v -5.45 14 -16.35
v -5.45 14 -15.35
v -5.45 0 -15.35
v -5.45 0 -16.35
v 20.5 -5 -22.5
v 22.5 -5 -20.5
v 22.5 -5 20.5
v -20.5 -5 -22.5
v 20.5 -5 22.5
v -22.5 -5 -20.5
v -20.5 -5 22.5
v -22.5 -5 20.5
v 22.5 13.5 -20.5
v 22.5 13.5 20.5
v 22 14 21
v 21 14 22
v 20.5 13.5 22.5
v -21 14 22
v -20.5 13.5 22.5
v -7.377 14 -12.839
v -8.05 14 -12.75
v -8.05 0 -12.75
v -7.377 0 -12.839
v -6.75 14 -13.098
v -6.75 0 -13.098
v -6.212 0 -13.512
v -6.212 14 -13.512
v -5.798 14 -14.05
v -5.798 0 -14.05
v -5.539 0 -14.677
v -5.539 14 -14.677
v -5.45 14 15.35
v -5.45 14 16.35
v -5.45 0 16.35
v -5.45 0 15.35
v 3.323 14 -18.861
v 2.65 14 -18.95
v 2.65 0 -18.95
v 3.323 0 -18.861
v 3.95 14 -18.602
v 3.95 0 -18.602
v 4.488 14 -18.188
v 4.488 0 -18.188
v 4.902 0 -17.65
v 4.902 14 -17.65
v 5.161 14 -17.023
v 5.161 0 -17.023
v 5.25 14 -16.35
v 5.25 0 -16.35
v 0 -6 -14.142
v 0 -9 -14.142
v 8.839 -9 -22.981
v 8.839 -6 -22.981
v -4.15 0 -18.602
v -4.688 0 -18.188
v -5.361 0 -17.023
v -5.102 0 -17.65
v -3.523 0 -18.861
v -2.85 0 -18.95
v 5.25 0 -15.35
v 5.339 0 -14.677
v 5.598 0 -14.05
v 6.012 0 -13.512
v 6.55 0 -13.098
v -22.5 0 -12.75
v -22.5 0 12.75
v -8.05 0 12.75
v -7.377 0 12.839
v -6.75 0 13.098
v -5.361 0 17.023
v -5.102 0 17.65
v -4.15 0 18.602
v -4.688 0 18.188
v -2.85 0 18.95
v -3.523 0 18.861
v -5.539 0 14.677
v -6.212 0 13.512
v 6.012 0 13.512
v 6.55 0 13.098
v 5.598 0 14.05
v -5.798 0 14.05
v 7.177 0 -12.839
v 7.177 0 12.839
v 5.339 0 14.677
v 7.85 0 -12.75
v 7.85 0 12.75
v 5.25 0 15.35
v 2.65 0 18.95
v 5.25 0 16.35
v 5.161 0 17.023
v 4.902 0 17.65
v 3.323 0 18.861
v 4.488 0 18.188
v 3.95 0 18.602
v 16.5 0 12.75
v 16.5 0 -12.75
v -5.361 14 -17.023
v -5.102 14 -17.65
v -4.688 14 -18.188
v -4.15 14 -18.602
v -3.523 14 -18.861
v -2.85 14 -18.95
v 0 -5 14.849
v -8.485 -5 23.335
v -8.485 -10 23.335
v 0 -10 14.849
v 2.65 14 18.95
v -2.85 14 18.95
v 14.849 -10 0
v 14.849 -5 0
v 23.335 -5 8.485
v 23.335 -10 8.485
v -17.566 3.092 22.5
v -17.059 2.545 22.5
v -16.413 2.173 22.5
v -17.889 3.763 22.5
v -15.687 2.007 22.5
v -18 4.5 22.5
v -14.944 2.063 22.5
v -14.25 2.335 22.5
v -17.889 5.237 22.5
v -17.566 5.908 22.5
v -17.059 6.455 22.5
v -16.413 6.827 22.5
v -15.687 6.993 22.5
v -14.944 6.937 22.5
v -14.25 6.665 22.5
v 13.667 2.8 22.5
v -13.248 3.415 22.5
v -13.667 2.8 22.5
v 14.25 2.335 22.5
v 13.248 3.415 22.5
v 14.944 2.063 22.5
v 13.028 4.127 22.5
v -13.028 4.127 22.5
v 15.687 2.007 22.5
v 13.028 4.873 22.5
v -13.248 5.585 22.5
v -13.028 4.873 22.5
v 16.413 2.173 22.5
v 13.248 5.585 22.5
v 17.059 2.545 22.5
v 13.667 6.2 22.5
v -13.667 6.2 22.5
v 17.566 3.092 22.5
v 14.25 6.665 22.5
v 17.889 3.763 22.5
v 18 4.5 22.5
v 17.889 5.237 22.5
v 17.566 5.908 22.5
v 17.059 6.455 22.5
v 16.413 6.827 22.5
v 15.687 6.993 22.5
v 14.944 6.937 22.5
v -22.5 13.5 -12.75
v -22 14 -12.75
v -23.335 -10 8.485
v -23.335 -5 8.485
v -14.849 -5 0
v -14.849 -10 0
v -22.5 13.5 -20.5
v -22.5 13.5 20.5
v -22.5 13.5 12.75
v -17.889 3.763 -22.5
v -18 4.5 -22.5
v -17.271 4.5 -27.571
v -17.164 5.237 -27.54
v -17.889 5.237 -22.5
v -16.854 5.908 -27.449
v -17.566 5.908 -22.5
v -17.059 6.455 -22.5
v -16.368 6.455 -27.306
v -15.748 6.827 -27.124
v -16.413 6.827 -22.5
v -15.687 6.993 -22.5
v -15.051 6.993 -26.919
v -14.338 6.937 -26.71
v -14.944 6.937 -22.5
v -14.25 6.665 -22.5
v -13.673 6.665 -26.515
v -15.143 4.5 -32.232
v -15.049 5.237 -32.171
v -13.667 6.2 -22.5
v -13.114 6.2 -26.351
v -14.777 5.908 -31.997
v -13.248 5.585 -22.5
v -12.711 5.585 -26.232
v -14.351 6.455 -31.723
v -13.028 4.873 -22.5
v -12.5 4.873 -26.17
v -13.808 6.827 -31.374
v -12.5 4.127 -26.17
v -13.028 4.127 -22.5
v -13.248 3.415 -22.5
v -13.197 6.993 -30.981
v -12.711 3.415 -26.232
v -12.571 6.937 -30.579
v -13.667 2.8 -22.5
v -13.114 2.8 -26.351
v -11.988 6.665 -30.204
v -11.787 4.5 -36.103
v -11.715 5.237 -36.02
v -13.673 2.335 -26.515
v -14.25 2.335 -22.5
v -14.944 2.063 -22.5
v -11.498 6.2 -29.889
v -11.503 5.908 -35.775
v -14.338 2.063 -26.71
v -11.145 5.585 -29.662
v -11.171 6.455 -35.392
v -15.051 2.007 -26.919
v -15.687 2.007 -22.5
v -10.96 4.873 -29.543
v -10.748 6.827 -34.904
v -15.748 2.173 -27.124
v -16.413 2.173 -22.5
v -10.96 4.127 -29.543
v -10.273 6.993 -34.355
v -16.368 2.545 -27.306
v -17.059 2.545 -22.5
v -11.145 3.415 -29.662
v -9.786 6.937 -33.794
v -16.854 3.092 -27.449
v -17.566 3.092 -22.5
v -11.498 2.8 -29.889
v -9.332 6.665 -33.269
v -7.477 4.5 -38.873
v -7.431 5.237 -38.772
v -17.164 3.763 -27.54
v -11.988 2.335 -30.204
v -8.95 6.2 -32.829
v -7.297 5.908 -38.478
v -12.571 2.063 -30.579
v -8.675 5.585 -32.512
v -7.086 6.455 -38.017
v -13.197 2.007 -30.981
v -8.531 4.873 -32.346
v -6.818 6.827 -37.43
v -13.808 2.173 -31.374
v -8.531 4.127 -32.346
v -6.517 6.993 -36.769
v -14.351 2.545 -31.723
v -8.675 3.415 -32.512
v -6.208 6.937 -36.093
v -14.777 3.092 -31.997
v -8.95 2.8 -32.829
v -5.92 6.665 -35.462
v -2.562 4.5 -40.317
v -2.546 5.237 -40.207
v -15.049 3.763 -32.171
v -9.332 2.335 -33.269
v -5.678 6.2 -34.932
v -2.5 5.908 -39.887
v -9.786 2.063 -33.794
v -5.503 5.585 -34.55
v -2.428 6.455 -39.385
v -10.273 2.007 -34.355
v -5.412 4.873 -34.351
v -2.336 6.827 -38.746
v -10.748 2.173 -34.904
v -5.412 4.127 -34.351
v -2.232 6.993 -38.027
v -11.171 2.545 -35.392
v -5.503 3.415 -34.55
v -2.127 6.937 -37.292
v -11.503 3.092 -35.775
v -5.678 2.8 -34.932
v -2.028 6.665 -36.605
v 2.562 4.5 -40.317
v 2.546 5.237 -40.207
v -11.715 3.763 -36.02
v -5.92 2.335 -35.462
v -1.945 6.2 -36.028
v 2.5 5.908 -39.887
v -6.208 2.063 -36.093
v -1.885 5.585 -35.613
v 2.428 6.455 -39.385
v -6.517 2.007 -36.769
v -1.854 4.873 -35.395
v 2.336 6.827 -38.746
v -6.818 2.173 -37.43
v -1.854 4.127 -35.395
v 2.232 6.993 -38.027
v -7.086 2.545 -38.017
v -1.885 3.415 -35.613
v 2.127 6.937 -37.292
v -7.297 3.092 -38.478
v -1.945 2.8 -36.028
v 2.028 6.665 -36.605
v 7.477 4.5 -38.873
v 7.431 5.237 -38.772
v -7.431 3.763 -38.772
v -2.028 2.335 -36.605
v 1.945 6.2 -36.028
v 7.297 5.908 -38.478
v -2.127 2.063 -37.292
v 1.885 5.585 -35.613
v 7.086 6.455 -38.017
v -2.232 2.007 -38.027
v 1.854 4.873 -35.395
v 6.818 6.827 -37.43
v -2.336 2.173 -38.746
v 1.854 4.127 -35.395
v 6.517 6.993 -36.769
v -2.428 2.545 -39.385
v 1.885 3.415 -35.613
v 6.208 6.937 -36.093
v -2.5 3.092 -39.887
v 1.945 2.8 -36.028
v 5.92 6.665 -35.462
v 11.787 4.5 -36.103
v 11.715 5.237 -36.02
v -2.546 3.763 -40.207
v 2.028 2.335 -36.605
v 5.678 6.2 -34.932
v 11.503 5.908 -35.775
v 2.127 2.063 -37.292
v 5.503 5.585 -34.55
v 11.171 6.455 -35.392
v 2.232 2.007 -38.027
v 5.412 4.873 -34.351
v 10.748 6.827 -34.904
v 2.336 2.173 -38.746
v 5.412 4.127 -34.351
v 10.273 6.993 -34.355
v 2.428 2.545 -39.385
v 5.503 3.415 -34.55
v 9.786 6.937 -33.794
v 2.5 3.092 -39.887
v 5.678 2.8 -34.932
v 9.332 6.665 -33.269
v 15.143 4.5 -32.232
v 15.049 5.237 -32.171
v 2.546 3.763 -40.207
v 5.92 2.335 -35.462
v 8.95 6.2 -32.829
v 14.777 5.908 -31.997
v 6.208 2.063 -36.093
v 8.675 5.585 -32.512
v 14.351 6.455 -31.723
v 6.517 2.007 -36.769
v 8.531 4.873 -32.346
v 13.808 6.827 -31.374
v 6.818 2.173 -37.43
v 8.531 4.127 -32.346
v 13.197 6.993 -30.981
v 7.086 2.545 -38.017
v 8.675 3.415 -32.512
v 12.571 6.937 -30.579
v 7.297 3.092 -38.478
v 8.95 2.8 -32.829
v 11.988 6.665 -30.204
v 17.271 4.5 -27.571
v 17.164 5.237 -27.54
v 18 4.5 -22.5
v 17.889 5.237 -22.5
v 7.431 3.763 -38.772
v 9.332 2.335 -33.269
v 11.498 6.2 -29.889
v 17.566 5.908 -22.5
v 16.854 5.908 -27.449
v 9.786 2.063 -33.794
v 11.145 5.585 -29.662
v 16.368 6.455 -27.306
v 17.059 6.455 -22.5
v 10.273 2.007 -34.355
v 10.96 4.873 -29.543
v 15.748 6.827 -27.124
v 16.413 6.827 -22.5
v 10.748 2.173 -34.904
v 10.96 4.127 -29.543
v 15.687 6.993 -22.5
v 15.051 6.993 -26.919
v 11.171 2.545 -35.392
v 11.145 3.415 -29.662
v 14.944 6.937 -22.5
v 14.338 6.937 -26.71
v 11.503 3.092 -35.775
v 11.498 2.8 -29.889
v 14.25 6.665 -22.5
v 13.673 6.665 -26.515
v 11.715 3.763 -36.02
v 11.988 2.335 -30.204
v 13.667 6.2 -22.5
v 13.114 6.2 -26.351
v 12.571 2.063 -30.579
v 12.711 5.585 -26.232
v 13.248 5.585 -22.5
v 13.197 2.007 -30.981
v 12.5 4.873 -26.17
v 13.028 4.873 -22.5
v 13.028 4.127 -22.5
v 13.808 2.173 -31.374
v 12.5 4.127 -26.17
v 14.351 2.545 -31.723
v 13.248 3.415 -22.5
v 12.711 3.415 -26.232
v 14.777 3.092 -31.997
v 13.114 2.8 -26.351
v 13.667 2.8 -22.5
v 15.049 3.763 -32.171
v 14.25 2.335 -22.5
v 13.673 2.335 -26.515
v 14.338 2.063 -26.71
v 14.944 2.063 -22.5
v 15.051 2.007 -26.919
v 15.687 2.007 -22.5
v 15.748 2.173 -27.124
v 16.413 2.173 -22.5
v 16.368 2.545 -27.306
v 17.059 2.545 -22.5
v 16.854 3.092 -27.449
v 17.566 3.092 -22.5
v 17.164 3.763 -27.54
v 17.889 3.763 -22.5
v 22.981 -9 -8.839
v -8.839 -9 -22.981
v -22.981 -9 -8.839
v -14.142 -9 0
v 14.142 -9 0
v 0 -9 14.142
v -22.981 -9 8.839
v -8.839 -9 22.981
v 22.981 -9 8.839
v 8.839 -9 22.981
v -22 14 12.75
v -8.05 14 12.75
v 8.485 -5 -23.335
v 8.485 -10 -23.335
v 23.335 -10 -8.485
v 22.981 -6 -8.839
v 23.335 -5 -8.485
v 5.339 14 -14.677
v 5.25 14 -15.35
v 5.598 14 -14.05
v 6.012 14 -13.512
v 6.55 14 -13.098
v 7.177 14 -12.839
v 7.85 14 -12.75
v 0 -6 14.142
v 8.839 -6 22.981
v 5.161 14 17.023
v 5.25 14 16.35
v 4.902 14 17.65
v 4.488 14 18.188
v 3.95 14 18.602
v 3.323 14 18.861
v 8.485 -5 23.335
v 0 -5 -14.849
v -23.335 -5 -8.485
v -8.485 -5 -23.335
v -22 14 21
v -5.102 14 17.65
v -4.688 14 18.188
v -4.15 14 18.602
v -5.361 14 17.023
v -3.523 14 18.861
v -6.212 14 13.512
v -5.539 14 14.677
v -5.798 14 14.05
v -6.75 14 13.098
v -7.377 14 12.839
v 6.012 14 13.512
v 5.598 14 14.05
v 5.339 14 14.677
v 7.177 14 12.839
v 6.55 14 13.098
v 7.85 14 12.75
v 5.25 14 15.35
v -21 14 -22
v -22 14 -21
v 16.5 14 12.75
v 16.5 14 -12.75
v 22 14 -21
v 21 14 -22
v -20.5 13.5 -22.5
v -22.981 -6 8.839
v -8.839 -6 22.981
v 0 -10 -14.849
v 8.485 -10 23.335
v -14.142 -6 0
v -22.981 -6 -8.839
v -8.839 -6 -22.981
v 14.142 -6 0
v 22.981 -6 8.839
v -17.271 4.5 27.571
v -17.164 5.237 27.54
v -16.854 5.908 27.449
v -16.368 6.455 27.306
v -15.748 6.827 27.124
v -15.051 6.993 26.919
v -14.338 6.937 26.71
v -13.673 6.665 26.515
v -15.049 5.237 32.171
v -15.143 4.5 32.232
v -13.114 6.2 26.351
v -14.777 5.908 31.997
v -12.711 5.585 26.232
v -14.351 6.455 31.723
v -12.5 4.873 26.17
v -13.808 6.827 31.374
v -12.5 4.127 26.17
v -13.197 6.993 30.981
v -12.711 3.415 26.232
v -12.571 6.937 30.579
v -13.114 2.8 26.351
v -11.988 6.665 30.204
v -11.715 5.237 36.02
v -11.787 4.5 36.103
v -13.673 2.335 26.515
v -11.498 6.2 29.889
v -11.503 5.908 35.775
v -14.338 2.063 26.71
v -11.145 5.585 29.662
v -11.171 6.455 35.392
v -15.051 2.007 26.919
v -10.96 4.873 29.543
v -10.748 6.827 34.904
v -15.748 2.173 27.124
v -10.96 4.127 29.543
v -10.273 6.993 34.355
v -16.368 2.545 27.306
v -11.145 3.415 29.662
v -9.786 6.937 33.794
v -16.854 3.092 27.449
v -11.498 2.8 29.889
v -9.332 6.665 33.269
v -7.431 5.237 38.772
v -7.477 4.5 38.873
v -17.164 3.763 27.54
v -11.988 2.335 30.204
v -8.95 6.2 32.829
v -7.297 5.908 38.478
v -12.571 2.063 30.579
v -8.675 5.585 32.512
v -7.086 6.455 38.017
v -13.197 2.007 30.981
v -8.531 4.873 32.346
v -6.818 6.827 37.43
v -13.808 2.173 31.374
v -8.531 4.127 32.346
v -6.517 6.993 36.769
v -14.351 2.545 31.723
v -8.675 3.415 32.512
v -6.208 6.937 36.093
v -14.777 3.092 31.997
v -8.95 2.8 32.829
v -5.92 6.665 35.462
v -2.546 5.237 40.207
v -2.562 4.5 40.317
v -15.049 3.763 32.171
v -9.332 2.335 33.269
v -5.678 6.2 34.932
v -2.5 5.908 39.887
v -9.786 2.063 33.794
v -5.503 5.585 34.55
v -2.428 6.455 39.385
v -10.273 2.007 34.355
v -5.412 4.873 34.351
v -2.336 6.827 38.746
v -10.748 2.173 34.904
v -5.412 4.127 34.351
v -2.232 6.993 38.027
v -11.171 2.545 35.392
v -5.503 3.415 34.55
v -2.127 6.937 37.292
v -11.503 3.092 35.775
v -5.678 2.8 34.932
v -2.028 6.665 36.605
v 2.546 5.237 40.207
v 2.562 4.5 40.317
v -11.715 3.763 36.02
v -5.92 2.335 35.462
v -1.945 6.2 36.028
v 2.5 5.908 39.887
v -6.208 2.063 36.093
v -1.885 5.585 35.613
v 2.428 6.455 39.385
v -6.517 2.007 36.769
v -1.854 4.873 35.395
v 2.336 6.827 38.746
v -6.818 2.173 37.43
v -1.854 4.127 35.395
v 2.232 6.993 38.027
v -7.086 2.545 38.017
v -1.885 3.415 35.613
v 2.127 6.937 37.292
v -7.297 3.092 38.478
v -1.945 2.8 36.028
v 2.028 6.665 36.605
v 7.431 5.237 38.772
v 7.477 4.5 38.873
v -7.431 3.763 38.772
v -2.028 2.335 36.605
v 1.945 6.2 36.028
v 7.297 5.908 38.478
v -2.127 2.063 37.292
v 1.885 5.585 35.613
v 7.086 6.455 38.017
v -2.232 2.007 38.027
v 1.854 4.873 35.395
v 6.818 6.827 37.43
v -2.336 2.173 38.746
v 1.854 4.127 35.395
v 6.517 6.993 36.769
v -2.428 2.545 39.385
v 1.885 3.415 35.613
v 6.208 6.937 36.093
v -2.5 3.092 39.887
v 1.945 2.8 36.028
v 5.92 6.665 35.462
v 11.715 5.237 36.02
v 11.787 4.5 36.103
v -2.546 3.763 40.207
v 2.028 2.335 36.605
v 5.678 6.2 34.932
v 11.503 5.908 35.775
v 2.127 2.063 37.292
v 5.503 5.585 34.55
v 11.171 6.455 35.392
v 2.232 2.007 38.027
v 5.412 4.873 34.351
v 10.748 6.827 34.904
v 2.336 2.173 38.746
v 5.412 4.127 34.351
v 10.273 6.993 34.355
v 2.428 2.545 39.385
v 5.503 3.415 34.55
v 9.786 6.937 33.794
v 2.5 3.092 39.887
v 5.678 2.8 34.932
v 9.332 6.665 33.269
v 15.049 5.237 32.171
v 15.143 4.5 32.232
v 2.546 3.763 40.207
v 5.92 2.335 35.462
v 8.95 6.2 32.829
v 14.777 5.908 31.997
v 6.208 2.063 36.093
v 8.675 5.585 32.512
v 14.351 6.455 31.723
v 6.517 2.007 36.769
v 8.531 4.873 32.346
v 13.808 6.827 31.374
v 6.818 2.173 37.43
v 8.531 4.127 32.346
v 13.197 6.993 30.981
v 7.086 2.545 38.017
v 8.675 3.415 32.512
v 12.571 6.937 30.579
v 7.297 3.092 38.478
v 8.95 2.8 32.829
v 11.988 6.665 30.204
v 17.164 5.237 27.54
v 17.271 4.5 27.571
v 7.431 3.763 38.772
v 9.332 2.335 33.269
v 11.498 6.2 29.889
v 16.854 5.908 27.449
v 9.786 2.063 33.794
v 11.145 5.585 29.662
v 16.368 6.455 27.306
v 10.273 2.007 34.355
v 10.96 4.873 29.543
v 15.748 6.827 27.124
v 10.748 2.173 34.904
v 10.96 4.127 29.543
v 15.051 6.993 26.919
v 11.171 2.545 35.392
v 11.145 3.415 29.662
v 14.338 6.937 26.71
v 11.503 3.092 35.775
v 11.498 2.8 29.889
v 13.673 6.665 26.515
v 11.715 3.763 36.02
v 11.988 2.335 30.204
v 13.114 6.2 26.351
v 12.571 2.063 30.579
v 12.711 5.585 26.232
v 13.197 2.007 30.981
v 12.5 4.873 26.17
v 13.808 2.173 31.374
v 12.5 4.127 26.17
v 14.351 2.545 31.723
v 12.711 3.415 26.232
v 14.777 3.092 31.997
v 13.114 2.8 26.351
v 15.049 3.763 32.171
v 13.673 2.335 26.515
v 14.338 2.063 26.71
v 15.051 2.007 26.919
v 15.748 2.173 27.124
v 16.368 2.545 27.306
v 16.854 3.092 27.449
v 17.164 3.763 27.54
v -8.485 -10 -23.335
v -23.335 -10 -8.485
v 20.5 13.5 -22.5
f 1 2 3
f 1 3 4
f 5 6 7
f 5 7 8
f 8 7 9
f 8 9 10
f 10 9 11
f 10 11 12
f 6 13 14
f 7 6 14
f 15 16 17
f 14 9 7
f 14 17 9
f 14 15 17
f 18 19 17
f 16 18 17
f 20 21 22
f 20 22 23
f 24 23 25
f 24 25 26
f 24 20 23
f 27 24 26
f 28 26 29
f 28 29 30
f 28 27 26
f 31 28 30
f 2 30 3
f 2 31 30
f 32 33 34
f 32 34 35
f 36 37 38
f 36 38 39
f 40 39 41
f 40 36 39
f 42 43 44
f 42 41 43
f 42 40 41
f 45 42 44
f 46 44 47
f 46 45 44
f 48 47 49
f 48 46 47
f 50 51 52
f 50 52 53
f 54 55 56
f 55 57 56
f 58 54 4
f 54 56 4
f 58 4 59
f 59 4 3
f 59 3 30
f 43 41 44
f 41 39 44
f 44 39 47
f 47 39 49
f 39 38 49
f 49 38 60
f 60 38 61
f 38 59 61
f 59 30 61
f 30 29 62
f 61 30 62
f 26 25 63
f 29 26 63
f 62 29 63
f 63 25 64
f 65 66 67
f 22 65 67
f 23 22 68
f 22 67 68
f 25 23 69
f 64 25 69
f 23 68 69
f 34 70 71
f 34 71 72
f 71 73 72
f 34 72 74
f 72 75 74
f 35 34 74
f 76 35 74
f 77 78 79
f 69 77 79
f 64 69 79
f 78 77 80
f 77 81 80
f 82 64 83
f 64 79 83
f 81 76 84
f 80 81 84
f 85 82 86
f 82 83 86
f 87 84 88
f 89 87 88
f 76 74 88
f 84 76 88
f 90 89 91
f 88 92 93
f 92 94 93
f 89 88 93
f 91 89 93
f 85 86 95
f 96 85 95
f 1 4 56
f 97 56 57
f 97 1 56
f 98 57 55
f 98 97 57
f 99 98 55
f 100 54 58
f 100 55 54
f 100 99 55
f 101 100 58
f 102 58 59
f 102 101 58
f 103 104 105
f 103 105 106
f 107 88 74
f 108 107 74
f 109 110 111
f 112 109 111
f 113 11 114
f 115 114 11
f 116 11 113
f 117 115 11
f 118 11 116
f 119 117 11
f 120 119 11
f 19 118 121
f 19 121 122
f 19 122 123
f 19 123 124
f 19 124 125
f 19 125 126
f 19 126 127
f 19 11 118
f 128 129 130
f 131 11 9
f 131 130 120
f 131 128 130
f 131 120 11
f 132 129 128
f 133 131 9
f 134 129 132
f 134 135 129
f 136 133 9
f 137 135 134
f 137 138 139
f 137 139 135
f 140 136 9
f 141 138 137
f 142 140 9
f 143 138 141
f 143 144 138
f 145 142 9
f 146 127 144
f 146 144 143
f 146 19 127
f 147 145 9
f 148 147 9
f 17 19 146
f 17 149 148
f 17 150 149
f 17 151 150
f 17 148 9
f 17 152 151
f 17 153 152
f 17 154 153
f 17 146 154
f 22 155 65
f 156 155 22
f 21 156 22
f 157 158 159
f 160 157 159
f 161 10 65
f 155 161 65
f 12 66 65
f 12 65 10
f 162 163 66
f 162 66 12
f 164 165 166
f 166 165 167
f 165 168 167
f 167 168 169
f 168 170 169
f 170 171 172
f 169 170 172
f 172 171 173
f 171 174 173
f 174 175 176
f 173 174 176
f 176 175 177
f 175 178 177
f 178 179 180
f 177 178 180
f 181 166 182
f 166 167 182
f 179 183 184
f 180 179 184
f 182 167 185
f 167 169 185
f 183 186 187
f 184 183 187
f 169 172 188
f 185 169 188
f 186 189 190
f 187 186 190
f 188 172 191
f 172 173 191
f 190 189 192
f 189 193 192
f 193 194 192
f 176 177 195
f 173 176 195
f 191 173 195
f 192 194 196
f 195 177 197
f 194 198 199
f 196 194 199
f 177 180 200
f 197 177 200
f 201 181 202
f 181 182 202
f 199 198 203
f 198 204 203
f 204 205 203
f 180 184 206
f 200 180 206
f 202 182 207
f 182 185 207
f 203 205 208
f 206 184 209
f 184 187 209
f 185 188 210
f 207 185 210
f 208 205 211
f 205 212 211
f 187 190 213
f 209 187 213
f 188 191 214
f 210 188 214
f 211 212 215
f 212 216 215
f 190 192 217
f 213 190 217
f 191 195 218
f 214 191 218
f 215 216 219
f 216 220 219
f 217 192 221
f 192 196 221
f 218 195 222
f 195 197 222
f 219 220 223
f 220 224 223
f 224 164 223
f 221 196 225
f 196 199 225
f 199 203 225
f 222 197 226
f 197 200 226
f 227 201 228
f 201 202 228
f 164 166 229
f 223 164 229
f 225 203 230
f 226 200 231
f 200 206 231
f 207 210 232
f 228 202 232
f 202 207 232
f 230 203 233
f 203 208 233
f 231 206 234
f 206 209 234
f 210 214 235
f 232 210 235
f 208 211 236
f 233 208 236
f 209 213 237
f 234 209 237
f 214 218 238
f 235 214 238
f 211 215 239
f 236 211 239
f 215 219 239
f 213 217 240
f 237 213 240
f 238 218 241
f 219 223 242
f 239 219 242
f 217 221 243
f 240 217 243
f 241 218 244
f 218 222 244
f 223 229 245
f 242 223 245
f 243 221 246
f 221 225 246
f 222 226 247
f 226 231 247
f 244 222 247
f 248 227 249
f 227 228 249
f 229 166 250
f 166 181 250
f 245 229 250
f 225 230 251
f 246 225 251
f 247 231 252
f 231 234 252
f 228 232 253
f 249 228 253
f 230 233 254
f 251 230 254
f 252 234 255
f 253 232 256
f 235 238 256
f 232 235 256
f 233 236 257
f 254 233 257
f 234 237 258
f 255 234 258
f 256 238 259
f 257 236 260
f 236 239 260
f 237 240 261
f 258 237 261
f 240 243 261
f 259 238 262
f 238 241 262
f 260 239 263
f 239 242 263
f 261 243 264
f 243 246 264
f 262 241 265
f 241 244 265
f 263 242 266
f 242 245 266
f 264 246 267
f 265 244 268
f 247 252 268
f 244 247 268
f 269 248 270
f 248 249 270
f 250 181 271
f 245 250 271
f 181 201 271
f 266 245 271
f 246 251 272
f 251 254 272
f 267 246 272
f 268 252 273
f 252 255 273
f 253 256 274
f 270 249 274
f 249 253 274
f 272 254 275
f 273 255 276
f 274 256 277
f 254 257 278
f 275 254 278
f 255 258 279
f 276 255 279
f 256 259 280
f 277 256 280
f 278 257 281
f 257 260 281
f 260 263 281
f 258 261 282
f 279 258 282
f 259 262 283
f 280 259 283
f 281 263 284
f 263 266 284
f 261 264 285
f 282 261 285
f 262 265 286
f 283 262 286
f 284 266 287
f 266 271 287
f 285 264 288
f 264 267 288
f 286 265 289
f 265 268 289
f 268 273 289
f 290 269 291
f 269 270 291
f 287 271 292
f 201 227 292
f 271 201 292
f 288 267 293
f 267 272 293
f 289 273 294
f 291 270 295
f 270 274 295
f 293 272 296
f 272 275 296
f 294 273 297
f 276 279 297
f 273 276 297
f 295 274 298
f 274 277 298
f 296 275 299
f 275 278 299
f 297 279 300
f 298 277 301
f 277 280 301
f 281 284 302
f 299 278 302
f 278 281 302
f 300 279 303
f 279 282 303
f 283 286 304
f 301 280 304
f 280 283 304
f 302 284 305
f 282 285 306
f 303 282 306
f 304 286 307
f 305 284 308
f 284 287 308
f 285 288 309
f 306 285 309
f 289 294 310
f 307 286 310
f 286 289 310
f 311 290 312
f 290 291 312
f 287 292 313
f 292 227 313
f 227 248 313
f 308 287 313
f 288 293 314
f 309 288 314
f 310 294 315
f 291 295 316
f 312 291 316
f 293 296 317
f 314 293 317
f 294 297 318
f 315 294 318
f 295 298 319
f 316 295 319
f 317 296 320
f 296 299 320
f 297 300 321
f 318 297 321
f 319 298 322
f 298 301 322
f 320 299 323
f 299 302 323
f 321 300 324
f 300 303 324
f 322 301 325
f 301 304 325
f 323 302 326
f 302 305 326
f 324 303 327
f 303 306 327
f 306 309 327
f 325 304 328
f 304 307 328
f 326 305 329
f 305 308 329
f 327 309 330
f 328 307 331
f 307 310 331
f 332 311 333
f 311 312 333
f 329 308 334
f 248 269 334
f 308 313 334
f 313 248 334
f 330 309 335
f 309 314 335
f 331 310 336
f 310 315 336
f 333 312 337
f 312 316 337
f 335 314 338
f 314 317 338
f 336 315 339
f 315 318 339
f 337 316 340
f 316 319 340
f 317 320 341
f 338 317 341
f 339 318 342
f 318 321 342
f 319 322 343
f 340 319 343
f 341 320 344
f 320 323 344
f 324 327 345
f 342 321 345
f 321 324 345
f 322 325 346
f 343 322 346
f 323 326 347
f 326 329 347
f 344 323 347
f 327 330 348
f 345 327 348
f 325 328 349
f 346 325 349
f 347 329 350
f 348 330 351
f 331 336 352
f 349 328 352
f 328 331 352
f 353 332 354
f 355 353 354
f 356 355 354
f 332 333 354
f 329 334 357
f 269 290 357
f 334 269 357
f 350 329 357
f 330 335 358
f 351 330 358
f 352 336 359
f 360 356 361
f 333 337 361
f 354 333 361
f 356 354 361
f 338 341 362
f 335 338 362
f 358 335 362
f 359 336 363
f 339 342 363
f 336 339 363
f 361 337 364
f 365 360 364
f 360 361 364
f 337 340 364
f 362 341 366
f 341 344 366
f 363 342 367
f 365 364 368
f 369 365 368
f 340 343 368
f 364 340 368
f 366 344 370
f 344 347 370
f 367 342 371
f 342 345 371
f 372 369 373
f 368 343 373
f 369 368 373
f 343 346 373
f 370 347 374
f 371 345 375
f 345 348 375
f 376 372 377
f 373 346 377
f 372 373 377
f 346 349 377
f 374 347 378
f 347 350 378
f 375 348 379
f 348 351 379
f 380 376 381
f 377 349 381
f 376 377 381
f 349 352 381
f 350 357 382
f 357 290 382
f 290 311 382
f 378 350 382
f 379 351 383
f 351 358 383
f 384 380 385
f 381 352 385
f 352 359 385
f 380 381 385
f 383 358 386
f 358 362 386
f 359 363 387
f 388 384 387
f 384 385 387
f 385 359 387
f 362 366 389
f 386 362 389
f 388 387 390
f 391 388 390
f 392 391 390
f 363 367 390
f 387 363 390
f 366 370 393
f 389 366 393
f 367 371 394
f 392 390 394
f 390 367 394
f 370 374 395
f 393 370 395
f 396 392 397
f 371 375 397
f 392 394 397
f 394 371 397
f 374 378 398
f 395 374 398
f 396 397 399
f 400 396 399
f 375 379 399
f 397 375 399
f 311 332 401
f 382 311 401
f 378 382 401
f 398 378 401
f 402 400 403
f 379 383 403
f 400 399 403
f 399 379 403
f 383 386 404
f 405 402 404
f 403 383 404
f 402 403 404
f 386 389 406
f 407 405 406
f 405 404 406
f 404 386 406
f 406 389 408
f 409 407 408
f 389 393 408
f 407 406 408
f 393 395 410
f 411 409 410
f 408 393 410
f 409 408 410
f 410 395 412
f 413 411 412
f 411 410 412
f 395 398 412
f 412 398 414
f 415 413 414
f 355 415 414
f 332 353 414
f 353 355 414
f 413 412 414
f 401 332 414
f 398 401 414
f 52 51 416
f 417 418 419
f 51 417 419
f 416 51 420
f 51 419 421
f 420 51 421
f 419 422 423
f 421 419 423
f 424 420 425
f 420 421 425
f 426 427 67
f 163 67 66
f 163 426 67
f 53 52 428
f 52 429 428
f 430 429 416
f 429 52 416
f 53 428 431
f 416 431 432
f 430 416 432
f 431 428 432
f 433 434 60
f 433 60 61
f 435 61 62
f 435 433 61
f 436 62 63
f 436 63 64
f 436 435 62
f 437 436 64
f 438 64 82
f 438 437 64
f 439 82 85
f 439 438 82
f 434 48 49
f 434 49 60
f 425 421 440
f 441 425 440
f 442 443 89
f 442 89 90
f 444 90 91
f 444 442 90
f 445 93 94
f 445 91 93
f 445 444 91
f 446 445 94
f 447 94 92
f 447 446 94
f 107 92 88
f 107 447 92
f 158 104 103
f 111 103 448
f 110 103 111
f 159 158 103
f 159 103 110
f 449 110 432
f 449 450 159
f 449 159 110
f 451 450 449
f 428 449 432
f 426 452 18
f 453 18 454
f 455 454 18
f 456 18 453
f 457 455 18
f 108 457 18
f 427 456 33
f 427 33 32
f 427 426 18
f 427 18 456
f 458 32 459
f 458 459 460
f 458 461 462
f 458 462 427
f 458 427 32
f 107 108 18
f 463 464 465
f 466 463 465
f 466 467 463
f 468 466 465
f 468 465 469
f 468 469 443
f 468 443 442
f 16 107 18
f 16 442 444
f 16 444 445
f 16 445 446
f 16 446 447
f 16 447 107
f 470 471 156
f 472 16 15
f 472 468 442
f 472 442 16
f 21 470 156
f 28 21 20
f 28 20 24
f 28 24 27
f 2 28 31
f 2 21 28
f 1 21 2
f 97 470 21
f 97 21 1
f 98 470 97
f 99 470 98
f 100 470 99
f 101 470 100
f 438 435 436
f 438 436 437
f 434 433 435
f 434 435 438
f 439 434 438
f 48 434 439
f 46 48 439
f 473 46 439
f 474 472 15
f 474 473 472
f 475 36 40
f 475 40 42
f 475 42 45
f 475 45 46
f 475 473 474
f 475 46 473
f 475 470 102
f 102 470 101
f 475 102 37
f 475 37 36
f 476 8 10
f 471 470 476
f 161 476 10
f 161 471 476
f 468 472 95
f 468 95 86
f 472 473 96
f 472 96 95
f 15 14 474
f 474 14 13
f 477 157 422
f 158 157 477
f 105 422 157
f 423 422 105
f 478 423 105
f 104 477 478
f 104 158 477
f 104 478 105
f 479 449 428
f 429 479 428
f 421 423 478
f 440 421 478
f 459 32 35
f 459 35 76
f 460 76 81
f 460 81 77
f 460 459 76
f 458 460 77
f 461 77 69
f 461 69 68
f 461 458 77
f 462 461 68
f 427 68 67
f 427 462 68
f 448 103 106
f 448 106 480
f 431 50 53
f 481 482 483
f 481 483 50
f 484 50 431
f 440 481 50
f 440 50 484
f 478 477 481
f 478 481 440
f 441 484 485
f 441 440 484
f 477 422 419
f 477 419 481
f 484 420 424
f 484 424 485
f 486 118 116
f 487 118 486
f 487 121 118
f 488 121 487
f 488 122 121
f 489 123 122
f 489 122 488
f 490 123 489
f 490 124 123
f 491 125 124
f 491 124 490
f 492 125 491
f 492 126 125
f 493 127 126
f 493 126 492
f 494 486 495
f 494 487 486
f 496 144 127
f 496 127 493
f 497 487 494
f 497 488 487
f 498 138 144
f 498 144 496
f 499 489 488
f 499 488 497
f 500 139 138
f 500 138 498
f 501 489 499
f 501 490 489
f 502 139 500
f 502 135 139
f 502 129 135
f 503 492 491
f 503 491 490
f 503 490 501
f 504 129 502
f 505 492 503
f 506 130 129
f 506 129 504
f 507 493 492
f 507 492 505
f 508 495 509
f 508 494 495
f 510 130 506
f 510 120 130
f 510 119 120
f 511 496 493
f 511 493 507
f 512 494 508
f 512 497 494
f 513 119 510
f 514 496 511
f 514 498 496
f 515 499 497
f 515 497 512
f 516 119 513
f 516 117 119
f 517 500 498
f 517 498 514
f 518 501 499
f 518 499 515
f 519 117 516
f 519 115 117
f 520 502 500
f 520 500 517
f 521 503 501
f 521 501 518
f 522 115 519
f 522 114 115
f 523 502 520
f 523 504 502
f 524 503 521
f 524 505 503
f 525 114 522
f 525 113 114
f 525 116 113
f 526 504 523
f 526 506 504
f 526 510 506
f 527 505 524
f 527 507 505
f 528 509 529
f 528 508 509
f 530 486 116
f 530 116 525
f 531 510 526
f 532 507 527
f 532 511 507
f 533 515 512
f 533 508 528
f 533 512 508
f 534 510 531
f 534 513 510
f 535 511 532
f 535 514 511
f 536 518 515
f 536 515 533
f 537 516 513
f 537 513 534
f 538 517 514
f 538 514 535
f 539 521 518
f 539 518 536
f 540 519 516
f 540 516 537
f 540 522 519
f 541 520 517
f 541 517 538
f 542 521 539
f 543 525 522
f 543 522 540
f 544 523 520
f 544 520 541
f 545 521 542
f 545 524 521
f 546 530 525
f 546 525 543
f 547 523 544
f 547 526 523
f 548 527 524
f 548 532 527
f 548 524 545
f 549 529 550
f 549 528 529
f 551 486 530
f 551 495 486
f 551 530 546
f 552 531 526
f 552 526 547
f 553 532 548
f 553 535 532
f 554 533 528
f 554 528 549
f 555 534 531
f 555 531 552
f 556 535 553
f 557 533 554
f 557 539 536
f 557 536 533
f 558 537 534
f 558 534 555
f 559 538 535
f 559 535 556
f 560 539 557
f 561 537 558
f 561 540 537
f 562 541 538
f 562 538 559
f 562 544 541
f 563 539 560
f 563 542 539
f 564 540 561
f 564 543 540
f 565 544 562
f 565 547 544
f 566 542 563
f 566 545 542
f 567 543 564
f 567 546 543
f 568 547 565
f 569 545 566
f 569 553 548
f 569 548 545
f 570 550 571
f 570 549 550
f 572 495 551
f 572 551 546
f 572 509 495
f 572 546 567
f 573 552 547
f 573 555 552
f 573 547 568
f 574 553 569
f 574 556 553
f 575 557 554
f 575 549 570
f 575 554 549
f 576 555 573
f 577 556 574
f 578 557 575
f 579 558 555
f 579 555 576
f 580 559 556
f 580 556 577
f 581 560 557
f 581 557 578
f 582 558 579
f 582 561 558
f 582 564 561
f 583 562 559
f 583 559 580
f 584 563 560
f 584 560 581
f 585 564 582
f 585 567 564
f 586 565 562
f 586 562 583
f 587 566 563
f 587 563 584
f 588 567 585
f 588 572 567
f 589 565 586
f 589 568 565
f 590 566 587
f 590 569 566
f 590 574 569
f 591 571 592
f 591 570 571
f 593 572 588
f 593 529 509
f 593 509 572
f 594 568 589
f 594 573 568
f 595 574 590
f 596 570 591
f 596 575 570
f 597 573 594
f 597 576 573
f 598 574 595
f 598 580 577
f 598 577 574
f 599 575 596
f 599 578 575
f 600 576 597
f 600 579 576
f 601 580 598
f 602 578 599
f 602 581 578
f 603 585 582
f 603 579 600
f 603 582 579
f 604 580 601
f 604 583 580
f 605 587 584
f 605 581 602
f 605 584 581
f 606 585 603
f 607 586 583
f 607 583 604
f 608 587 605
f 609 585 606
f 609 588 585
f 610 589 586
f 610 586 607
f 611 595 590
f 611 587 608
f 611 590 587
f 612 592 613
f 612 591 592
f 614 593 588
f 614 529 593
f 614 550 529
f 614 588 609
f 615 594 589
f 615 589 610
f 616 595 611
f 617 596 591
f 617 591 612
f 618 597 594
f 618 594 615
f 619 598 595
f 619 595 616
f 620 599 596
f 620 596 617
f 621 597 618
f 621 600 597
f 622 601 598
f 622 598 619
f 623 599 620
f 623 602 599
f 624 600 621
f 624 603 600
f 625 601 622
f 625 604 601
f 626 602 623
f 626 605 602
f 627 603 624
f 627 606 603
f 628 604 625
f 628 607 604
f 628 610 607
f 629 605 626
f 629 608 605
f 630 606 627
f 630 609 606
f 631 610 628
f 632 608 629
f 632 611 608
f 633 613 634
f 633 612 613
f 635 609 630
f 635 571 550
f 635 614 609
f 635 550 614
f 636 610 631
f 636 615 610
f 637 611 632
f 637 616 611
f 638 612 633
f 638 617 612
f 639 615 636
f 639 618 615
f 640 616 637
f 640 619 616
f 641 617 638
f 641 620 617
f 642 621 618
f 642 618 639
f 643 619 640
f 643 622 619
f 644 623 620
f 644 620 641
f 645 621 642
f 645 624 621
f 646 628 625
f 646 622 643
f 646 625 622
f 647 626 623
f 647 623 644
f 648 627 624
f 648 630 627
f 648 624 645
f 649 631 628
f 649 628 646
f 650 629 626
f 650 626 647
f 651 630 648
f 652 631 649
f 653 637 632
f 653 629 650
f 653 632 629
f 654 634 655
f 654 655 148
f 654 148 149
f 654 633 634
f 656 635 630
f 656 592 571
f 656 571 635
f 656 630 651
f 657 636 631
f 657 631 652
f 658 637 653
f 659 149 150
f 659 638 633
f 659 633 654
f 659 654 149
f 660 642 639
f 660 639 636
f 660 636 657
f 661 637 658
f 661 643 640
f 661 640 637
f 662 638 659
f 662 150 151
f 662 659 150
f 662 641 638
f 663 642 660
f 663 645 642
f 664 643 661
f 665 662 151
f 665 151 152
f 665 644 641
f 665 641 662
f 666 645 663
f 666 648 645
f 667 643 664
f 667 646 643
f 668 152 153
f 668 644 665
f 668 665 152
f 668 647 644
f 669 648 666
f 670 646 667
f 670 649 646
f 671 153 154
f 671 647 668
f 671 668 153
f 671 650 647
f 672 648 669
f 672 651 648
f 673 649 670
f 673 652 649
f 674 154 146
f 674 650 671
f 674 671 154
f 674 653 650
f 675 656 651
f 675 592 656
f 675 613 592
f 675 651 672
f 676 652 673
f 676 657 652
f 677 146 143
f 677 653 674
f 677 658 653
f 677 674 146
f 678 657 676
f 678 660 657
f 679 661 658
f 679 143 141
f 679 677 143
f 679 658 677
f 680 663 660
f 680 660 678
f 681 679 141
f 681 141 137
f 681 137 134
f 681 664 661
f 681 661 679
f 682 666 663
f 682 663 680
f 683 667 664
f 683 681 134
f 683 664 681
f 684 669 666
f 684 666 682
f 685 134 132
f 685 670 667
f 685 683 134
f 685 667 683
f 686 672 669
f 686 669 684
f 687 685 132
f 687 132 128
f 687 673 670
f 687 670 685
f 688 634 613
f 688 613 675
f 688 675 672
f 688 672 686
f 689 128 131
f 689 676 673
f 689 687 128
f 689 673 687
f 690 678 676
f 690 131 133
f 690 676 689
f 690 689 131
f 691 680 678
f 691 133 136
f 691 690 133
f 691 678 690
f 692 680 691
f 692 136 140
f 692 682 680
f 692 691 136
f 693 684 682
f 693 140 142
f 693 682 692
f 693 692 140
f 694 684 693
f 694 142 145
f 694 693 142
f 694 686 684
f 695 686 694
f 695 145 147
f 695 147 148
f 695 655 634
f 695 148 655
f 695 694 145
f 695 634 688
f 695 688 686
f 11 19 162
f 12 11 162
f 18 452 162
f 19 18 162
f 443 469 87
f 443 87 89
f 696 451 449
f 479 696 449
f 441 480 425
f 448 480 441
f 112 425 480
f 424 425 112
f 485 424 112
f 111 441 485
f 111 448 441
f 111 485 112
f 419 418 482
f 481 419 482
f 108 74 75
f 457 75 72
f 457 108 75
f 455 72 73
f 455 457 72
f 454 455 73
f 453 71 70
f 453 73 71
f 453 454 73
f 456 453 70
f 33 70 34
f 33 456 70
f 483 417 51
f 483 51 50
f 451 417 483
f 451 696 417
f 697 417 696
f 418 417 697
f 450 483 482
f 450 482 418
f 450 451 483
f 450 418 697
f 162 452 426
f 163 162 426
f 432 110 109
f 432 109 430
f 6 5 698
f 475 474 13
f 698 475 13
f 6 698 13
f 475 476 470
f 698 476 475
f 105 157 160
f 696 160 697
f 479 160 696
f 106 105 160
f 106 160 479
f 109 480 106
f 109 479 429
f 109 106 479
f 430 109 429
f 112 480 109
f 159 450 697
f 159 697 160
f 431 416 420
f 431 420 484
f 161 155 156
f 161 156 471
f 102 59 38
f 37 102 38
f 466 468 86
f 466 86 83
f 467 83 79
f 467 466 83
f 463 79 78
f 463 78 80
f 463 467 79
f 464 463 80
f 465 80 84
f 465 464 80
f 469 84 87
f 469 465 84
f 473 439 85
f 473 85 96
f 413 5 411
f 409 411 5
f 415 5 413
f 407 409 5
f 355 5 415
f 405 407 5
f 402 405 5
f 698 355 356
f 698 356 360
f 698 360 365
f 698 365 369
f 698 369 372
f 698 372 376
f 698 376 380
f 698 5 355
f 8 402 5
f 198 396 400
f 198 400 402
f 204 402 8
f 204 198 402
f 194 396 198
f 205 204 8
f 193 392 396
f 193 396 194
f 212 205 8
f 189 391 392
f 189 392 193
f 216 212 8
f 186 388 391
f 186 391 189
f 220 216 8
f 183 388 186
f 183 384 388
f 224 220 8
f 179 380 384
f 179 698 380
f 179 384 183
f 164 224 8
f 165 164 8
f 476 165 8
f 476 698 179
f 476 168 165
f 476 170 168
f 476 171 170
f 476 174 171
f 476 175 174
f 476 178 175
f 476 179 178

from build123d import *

# Parameters (mm, degrees)
SKETCH1_W             = 45
SKETCH1_H             = 45
BOSS_EXTRUDE1_DEPTH   = 14
CUT_EXTRUDE1_DEPTH    = 35.763486592
CHAMFER1_SIZE         = 0.5
CHAMFER2_SIZE         = 2
SKETCH4_R             = 1.75
CUT_EXTRUDE2_DEPTH    = 35.763486592
SKETCH5_R             = 1.75
SKETCH5_W             = 41
SKETCH5_H             = 2
SKETCH5_W_2           = 2
SKETCH5_H_2           = 41
BOSS_EXTRUDE3_DEPTH   = 5
SKETCH6_R             = 1.75
BOSS_EXTRUDE4_DEPTH   = 19
REVOLVE4_OUTLINE_R    = 2.5
REVOLVE4_ANGLE        = 180
SKETCH27_W            = 21
SKETCH27_H            = 12
SKETCH27_W_2          = 12
SKETCH27_H_2          = 21
BOSS_EXTRUDE6_DEPTH   = 5
BODY_MOVE_COPY1_ANGLE = 45
SKETCH31_W            = 20
SKETCH31_H            = 3
CUT_EXTRUDE5_DEPTH    = 71.129894544
SKETCH33_W            = 20
SKETCH33_H            = 3
CUT_EXTRUDE6_DEPTH    = 71.129894544


# Read off the part's stored shape, not the designer's step: Revolve4, Split1
with BuildPart() as part:
    # Sketch1 → Boss-Extrude1 (new body)
    with BuildSketch(Plane(origin=(0, 0, 0), x_dir=(1, 0, 0), z_dir=(0, 1, 0))):
        Rectangle(SKETCH1_W, SKETCH1_H)
    extrude(amount=BOSS_EXTRUDE1_DEPTH)

    # Sketch3 → Cut-Extrude1 (cut, through all)
    with BuildSketch(Plane(origin=(0, 14, 0), x_dir=(1, 0, 0), z_dir=(0, 1, 0))):
        with BuildLine():
            Line((-22.5, 12.75), (-8.05, 12.75))
            ThreePointArc((-8.05, 12.75), (-6.211522369, 13.511522369), (-5.45, 15.35))
            Line((-5.45, 15.35), (-5.45, 16.35))
            ThreePointArc((-5.45, 16.35), (-4.688477631, 18.188477631), (-2.85, 18.95))
            Line((-2.85, 18.95), (2.65, 18.95))
            ThreePointArc((2.65, 18.95), (4.488477631, 18.188477631), (5.25, 16.35))
            Line((5.25, 16.35), (5.25, 15.35))
            ThreePointArc((5.25, 15.35), (6.011522369, 13.511522369), (7.85, 12.75))
            Line((7.85, 12.75), (16.5, 12.75))
            Line((16.5, 12.75), (16.5, -12.75))
            Line((16.5, -12.75), (7.85, -12.75))
            ThreePointArc((7.85, -12.75), (6.011522369, -13.511522369), (5.25, -15.35))
            Line((5.25, -15.35), (5.25, -16.35))
            ThreePointArc((5.25, -16.35), (4.488477631, -18.188477631), (2.65, -18.95))
            Line((2.65, -18.95), (-2.85, -18.95))
            ThreePointArc((-2.85, -18.95), (-4.688477631, -18.188477631), (-5.45, -16.35))
            Line((-5.45, -16.35), (-5.45, -15.35))
            ThreePointArc((-5.45, -15.35), (-6.211522369, -13.511522369), (-8.05, -12.75))
            Line((-8.05, -12.75), (-22.5, -12.75))
            Line((-22.5, -12.75), (-22.5, 12.75))
        make_face()
    extrude(amount=-CUT_EXTRUDE1_DEPTH, mode=Mode.SUBTRACT)

    # Chamfer1
    chamfer1_edges = [part.edges().sort_by_distance(p)[0] for p in [
        (-22.5, 14, -17.625),
        (0, 14, 22.5),
        (-22.5, 14, 17.625),
        (22.5, 14, 0),
        (0, 14, -22.5),
    ]]
    chamfer(chamfer1_edges, length=CHAMFER1_SIZE)

    # Chamfer2
    # the kernel refuses this chamfer: 5.464101615, 2 mm, written as the material it takes off along each edge
    # the kernel refuses this chamfer: 5.464101615, 2 mm, written as the material it takes off along each edge
    with BuildSketch(Plane(origin=(-22.5, -5.143365976, -22.5), x_dir=(-0.027495876610585647, 0, 0.9996219169112968), z_dir=(0, 1, 0)), Plane(origin=(-22.5, -5.143365976, 22.5), x_dir=(0.9996219169112968, 0, 0.027495876610585647), z_dir=(0, 1, 0))) as chamfer2_2_piece_1:
        Polygon((CHAMFER2_SIZE * 0.999621916911, CHAMFER2_SIZE * 0.0274958766106), (-CHAMFER2_SIZE * 0.0274958766106, CHAMFER2_SIZE * 0.999621916911), (0, 0), align=None)
    extrude(amount=23.786731952, mode=Mode.SUBTRACT)
    with BuildSketch(Plane(origin=(22.5, -5.143365976, 22.5), x_dir=(-0.9996219169112968, 0, 0.027495876610585647), z_dir=(0, 1, 0)), Plane(origin=(22.5, -5.143365976, -22.5), x_dir=(0.027495876610585647, 0, 0.9996219169112968), z_dir=(0, 1, 0))) as chamfer2_2_piece_2:
        Polygon((CHAMFER2_SIZE * 0.999621916911, -CHAMFER2_SIZE * 0.0274958766106), (-CHAMFER2_SIZE * 0.0274958766106, -CHAMFER2_SIZE * 0.999621916911), (0, 0), align=None)
    extrude(amount=23.786731952, mode=Mode.SUBTRACT)

    # Sketch4 → Cut-Extrude2 (cut, through all)
    with BuildSketch(Plane(origin=(0, 14, 0), x_dir=(1, 0, 0), z_dir=(0, 1, 0))):
        with Locations(Location((-18, 17.25, 0), (0, 0, 270))):
            Circle(SKETCH4_R)
        with Locations(Location((18, 17.25, 0), (0, 0, 270))):
            Circle(SKETCH4_R)
        with Locations(Location((18, -17.25, 0), (0, 0, 270))):
            Circle(SKETCH4_R)
        with Locations(Location((-18, -17.25, 0), (0, 0, 270))):
            Circle(SKETCH4_R)
    extrude(amount=-CUT_EXTRUDE2_DEPTH, mode=Mode.SUBTRACT)

    # Sketch5 → Boss-Extrude3 (add)
    # profile 1 of 7: a face of its own
    with BuildSketch(Plane.XZ):
        with BuildLine():
            Line((20.5, 20.5), (20.5, -22.5))
            Line((20.5, -22.5), (-20.5, -22.5))
            Line((-20.5, -22.5), (-22.5, -20.5))
            Line((-22.5, -20.5), (-22.5, -12.75))
            Line((-22.5, -12.75), (-8.05, -12.75))
            ThreePointArc((-8.05, -12.75), (-6.211522369, -13.511522369), (-5.45, -15.35))
            Line((-5.45, -15.35), (-5.45, -16.35))
            ThreePointArc((-5.45, -16.35), (-4.688477631, -18.188477631), (-2.85, -18.95))
            Line((-2.85, -18.95), (2.65, -18.95))
            ThreePointArc((2.65, -18.95), (4.488477631, -18.188477631), (5.25, -16.35))
            Line((5.25, -16.35), (5.25, -15.35))
            ThreePointArc((5.25, -15.35), (6.011522369, -13.511522369), (7.85, -12.75))
            Line((7.85, -12.75), (16.5, -12.75))
            Line((16.5, -12.75), (16.5, 12.75))
            Line((16.5, 12.75), (7.85, 12.75))
            ThreePointArc((7.85, 12.75), (6.011522369, 13.511522369), (5.25, 15.35))
            Line((5.25, 15.35), (5.25, 16.35))
            ThreePointArc((5.25, 16.35), (4.488477631, 18.188477631), (2.65, 18.95))
            Line((2.65, 18.95), (-2.85, 18.95))
            ThreePointArc((-2.85, 18.95), (-4.688477631, 18.188477631), (-5.45, 16.35))
            Line((-5.45, 16.35), (-5.45, 15.35))
            ThreePointArc((-5.45, 15.35), (-6.211522369, 13.511522369), (-8.05, 12.75))
            Line((-8.05, 12.75), (-22.5, 12.75))
            Line((-22.5, 12.75), (-22.5, 20.5))
            Line((-22.5, 20.5), (20.5, 20.5))
        make_face()
        with Locations(Location((18, 17.25, 0), (0, 0, 90))):
            Circle(SKETCH5_R, mode=Mode.SUBTRACT)
        with Locations(Location((-18, -17.25, 0), (0, 0, 90))):
            Circle(SKETCH5_R, mode=Mode.SUBTRACT)
        with Locations(Location((18, -17.25, 0), (0, 0, 90))):
            Circle(SKETCH5_R, mode=Mode.SUBTRACT)
        with Locations(Location((-18, 17.25, 0), (0, 0, 90))):
            Circle(SKETCH5_R, mode=Mode.SUBTRACT)
    # profile 2 of 7: a face of its own
    with BuildSketch(Plane.XZ):
        with Locations((0, 21.5)):
            Rectangle(SKETCH5_W, SKETCH5_H)
    # profile 3 of 7: a face of its own
    with BuildSketch(Plane.XZ):
        Polygon((-22.5, 20.5), (-20.5, 20.5), (-20.5, 22.5), align=None)
    # profile 4 of 7: a face of its own
    with BuildSketch(Plane.XZ):
        Polygon((22.5, 20.5), (20.5, 20.5), (20.5, 22.5), align=None)
    # profile 5 of 7: a face of its own
    with BuildSketch(Plane.XZ):
        with Locations((21.5, 0)):
            Rectangle(SKETCH5_W_2, SKETCH5_H_2)
    # profile 6 of 7: a face of its own
    with BuildSketch(Plane.XZ):
        Polygon((20.5, -20.5), (20.5, -22.5), (22.5, -20.5), align=None)
    # profile 7 of 7: a face of its own
    with BuildSketch(Plane.XZ):
        with BuildLine():
            Line((-22.5, 12.75), (-22.5, -12.75))
            Line((-22.5, -12.75), (-8.05, -12.75))
            ThreePointArc((-8.05, -12.75), (-6.211522369, -13.511522369), (-5.45, -15.35))
            Line((-5.45, -15.35), (-5.45, -16.35))
            ThreePointArc((-5.45, -16.35), (-4.688477631, -18.188477631), (-2.85, -18.95))
            Line((-2.85, -18.95), (2.65, -18.95))
            ThreePointArc((2.65, -18.95), (4.488477631, -18.188477631), (5.25, -16.35))
            Line((5.25, -16.35), (5.25, -15.35))
            ThreePointArc((5.25, -15.35), (6.011522369, -13.511522369), (7.85, -12.75))
            Line((7.85, -12.75), (16.5, -12.75))
            Line((16.5, -12.75), (16.5, 12.75))
            Line((16.5, 12.75), (7.85, 12.75))
            ThreePointArc((7.85, 12.75), (6.011522369, 13.511522369), (5.25, 15.35))
            Line((5.25, 15.35), (5.25, 16.35))
            ThreePointArc((5.25, 16.35), (4.488477631, 18.188477631), (2.65, 18.95))
            Line((2.65, 18.95), (-2.85, 18.95))
            ThreePointArc((-2.85, 18.95), (-4.688477631, 18.188477631), (-5.45, 16.35))
            Line((-5.45, 16.35), (-5.45, 15.35))
            ThreePointArc((-5.45, 15.35), (-6.211522369, 13.511522369), (-8.05, 12.75))
            Line((-8.05, 12.75), (-22.5, 12.75))
        make_face()
    extrude(amount=BOSS_EXTRUDE3_DEPTH)

    # Sketch6 → Boss-Extrude4 (add)
    with BuildSketch(Plane(origin=(0, 14, 0), x_dir=(1, 0, 0), z_dir=(0, 1, 0))):
        with Locations((-18, 17.25)):
            Circle(SKETCH6_R)
        with Locations((18, 17.25)):
            Circle(SKETCH6_R)
        with Locations((-18, -17.25)):
            Circle(SKETCH6_R)
        with Locations((18, -17.25)):
            Circle(SKETCH6_R)
    extrude(amount=-BOSS_EXTRUDE4_DEPTH)

    # Revolve4 outline → Revolve4 (revolve)
    with BuildSketch(Plane(origin=(0, 0, 22.5), x_dir=(-1, 0, 0), z_dir=(0, 0, -1))):
        with Locations((15.5, 4.5)):
            Circle(REVOLVE4_OUTLINE_R)
    revolve4 = revolve(axis=Axis((0, 0, 22.5), (0, 1, 0)), revolution_arc=REVOLVE4_ANGLE)

    # Mirror1: Revolve4 across plane
    add(revolve4.mirror(Plane.XY))

    # Sketch27 → Boss-Extrude6 (add)
    with BuildSketch(Plane.XZ.offset(5)):
        with Locations((0, 16.5)):
            Rectangle(SKETCH27_W, SKETCH27_H)
        with Locations((-16.5, 0)):
            Rectangle(SKETCH27_W_2, SKETCH27_H_2)
        Rectangle(SKETCH27_W, SKETCH27_H_2)
        with Locations((16.5, 0)):
            Rectangle(SKETCH27_W_2, SKETCH27_H_2)
        with Locations((0, -16.5)):
            Rectangle(SKETCH27_W, SKETCH27_H)
    extrude(amount=BOSS_EXTRUDE6_DEPTH)


with BuildPart() as body_2:
    # Split1: the piece on the far side of the plane
    add(part.part)
    split(bisect_by=Plane(origin=(0, -5, 0), x_dir=(1, 0, 0), z_dir=(0, 1, 0)), keep=Keep.BOTTOM)


with BuildPart() as part_1:
    add(part.part)

    # Split1
    split(bisect_by=Plane(origin=(0, -5, 0), x_dir=(1, 0, 0), z_dir=(0, 1, 0)), keep=Keep.TOP)


with BuildPart() as body_2_1:
    # Body-Move/Copy1: moved
    add(body_2.part.rotate(Axis((0, 0, 0), (0, 1, 0)), BODY_MOVE_COPY1_ANGLE))

    # Sketch31 → Cut-Extrude5 (cut, through all)
    with BuildSketch(Plane(origin=(15.909902577, 0, 15.909902577), x_dir=(0.7071067811864872, 0, -0.707106781186608), z_dir=(0.707106781186608, 0, 0.7071067811864872))):
        with Locations((0, -7.5)):
            Rectangle(SKETCH31_W, SKETCH31_H)
    extrude(amount=-CUT_EXTRUDE5_DEPTH, mode=Mode.SUBTRACT)

    # Sketch33 → Cut-Extrude6 (cut, through all)
    with BuildSketch(Plane(origin=(-15.909902577, 0, 15.909902577), x_dir=(0.707106781186608, 0, 0.7071067811864872), z_dir=(-0.7071067811864872, 0, 0.707106781186608))):
        with Locations((0, -7.5)):
            Rectangle(SKETCH33_W, SKETCH33_H)
    extrude(amount=-CUT_EXTRUDE6_DEPTH, mode=Mode.SUBTRACT)


solid = Compound([part_1.part, body_2_1.part])
